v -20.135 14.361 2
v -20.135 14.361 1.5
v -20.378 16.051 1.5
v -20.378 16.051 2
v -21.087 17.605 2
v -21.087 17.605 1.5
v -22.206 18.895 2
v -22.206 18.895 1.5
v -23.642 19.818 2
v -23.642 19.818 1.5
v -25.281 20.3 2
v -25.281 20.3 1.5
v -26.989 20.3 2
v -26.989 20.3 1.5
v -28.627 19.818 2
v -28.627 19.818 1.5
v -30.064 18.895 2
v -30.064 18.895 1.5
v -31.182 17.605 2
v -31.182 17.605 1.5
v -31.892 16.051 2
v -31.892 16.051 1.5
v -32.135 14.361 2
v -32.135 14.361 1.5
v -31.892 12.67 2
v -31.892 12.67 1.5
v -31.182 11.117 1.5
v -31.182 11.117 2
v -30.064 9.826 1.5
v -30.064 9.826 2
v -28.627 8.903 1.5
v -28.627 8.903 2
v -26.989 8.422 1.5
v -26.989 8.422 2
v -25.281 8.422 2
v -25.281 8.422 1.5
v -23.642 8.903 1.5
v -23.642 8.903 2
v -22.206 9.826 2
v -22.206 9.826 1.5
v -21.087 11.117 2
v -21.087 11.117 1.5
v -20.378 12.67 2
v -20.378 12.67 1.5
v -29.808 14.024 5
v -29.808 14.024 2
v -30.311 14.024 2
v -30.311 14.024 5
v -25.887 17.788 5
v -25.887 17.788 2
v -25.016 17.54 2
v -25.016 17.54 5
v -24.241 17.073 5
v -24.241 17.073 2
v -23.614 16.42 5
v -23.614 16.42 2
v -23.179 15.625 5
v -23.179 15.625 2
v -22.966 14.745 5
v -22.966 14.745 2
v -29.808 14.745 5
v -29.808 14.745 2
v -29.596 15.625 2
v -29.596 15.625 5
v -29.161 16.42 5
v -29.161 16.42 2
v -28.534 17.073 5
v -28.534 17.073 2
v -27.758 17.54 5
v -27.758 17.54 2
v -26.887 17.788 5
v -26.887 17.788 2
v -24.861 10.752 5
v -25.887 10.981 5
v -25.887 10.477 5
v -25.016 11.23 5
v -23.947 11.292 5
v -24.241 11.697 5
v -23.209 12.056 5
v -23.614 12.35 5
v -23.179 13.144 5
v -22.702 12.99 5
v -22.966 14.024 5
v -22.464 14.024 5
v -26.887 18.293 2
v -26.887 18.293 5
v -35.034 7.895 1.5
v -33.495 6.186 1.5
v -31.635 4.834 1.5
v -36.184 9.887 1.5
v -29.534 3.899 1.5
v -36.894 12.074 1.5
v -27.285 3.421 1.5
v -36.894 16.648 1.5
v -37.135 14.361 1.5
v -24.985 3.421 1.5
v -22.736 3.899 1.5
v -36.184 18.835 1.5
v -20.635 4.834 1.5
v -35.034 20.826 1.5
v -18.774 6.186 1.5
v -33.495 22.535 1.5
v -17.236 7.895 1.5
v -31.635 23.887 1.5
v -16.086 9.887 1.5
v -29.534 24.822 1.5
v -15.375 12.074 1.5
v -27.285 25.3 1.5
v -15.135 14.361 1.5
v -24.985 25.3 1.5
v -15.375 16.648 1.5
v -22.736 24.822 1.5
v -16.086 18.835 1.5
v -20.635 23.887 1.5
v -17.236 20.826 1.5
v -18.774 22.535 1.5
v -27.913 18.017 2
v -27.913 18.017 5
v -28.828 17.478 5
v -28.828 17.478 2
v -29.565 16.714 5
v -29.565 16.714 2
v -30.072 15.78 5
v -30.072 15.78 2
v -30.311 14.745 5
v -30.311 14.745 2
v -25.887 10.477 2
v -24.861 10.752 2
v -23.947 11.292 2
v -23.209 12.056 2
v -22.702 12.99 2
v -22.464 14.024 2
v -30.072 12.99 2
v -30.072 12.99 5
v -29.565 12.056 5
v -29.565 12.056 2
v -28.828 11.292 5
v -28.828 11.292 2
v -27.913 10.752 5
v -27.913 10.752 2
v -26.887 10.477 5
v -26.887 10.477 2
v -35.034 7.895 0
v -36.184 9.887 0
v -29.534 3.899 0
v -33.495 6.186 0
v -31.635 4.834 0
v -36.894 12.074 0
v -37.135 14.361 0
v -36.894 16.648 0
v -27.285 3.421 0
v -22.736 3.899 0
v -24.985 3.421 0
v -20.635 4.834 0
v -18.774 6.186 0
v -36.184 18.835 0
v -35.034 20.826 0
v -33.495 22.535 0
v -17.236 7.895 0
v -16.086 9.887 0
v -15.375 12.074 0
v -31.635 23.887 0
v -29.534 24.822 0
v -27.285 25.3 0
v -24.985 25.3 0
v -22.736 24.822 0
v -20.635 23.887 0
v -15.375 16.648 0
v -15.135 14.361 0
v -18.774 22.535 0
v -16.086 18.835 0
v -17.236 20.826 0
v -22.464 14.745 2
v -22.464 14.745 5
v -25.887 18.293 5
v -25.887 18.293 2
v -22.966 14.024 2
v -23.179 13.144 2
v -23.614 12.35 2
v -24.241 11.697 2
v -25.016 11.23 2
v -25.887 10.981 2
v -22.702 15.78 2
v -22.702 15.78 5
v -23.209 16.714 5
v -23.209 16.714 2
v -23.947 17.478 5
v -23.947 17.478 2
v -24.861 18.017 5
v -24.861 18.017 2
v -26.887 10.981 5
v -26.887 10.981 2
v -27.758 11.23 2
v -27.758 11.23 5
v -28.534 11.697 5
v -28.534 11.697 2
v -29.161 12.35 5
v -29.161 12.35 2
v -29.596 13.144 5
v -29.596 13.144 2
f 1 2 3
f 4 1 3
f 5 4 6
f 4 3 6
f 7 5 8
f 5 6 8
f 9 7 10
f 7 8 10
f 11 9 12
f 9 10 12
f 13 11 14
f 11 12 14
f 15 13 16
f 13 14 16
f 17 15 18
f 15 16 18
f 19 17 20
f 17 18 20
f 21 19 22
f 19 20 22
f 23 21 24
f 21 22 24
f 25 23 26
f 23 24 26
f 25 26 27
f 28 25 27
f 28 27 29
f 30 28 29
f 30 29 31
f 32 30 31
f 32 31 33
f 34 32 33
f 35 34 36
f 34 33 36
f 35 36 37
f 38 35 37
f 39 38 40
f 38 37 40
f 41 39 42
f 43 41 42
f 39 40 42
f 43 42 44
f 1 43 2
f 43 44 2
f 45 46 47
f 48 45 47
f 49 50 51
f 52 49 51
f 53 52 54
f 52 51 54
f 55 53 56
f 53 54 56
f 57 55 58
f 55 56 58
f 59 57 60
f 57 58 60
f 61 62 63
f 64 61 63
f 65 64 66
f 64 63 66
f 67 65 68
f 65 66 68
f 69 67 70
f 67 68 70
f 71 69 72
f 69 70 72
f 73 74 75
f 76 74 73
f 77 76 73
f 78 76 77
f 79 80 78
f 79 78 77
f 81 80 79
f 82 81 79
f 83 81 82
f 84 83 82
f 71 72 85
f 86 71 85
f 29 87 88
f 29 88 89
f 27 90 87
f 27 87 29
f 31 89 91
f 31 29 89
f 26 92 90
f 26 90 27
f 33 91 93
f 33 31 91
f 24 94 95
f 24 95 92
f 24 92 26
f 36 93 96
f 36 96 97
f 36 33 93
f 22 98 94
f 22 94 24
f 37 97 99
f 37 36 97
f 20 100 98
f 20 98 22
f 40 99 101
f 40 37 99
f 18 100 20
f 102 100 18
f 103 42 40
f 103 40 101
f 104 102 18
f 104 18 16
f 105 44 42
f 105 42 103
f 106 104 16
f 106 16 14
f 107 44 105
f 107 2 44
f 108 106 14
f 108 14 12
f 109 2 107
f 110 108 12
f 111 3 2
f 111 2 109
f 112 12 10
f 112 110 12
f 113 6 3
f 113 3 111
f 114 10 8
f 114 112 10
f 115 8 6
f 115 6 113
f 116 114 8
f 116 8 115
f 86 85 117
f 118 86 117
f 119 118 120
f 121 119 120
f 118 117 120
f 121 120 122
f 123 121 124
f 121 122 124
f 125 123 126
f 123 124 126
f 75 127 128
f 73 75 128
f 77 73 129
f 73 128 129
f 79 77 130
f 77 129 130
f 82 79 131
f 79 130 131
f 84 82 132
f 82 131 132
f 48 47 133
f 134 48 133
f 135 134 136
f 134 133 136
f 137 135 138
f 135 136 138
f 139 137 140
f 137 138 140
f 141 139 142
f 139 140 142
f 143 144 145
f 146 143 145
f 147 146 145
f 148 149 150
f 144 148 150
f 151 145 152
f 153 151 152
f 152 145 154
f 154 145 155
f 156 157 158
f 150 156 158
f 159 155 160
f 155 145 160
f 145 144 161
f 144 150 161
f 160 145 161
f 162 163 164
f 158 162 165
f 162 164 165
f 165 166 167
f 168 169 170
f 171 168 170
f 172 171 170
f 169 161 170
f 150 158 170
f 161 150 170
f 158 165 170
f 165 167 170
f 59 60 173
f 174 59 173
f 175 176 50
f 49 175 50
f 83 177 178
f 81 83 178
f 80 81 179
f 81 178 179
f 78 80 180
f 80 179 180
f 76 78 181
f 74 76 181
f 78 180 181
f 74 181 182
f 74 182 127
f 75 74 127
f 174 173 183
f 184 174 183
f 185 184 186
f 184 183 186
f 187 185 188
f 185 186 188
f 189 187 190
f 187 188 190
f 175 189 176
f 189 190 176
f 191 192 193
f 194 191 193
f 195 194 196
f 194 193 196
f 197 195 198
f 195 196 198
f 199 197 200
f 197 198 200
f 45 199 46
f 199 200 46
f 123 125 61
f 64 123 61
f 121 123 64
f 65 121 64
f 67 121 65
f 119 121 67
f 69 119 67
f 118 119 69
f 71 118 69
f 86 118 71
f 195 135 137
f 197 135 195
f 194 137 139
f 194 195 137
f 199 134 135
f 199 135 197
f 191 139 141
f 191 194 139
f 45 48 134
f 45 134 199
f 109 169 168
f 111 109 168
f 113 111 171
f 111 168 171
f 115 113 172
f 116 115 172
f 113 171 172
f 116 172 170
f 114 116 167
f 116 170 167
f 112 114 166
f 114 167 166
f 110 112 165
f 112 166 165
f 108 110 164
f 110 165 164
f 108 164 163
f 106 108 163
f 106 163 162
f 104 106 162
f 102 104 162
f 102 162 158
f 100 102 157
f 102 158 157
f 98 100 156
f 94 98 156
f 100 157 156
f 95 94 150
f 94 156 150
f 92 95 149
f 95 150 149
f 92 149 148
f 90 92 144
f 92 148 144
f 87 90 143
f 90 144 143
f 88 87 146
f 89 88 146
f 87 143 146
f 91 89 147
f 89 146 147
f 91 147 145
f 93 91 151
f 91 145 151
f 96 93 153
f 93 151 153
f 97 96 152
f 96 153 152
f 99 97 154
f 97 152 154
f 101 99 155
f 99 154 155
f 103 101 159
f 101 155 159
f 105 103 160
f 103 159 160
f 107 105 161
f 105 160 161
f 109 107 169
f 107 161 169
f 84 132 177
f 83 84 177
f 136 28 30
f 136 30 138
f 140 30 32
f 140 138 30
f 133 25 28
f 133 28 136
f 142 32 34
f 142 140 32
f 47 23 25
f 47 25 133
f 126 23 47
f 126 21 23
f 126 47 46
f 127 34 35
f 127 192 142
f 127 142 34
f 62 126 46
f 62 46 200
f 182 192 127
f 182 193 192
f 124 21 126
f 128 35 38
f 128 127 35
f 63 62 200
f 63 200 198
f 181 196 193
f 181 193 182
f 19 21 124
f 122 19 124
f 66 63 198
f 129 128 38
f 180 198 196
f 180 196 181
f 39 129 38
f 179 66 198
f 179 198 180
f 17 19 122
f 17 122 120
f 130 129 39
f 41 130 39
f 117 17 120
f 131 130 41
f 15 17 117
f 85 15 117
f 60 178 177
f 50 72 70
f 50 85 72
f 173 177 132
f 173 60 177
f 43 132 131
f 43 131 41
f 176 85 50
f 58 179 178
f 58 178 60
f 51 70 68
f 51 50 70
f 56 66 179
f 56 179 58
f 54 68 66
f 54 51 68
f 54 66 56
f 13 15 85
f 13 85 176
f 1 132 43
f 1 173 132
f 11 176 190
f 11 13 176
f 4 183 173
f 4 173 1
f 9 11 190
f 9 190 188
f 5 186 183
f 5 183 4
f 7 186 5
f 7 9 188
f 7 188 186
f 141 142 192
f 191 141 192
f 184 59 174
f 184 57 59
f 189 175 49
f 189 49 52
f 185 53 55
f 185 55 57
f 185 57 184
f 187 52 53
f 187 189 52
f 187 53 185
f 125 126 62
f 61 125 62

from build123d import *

# Parameters (mm, degrees)
F1_R     = 11
F2_DEPTH = 1.5
F4_R     = 6.000001
F5_DEPTH = 0.5
F7_DEPTH = 3


with BuildPart() as f2:
    # F1 (on Top) → F2 (new body)
    with BuildSketch(Plane.XY):
        with Locations((-26.134714, 14.360657)):
            Circle(F1_R)
    extrude(amount=F2_DEPTH)

    # F4 (on face) → F5 (join)
    with BuildSketch(Plane.XY.offset(1.5)):
        with Locations((-26.134714, 14.360657)):
            Circle(F4_R)
    extrude(amount=F5_DEPTH)

    # F6 (on face) → F7 (join)
    with BuildSketch(Plane.XY.offset(2)):
        with BuildLine():
            Line((-25.887165, 10.981324), (-25.887165, 10.476647))
            ThreePointArc((-25.887165, 10.476647), (-23.551928, 11.648914), (-22.463676, 14.024466))
            Line((-22.463676, 14.024466), (-22.966088, 14.024466))
            ThreePointArc((-22.966088, 14.024466), (-23.905454, 12.002628), (-25.887165, 10.981324))
        make_face()
        with BuildLine():
            ThreePointArc((-26.887165, 10.981324), (-28.868875, 12.002628), (-29.808241, 14.024466))
            Line((-29.808241, 14.024466), (-30.310653, 14.024466))
            ThreePointArc((-30.310653, 14.024466), (-29.222401, 11.648914), (-26.887165, 10.476647))
            Line((-26.887165, 10.476647), (-26.887165, 10.981324))
        make_face()
        with BuildLine():
            ThreePointArc((-29.808241, 14.745119), (-28.868875, 16.766958), (-26.887165, 17.788262))
            Line((-26.887165, 17.788262), (-26.887165, 18.292938))
            ThreePointArc((-26.887165, 18.292938), (-29.222401, 17.120671), (-30.310653, 14.745119))
            Line((-30.310653, 14.745119), (-29.808241, 14.745119))
        make_face()
        with BuildLine():
            Line((-22.966088, 14.745119), (-22.463676, 14.745119))
            ThreePointArc((-22.463676, 14.745119), (-23.551928, 17.120671), (-25.887165, 18.292938))
            Line((-25.887165, 18.292938), (-25.887165, 17.788262))
            ThreePointArc((-25.887165, 17.788262), (-23.905454, 16.766958), (-22.966088, 14.745119))
        make_face()
    extrude(amount=F7_DEPTH)


solid = f2.part
